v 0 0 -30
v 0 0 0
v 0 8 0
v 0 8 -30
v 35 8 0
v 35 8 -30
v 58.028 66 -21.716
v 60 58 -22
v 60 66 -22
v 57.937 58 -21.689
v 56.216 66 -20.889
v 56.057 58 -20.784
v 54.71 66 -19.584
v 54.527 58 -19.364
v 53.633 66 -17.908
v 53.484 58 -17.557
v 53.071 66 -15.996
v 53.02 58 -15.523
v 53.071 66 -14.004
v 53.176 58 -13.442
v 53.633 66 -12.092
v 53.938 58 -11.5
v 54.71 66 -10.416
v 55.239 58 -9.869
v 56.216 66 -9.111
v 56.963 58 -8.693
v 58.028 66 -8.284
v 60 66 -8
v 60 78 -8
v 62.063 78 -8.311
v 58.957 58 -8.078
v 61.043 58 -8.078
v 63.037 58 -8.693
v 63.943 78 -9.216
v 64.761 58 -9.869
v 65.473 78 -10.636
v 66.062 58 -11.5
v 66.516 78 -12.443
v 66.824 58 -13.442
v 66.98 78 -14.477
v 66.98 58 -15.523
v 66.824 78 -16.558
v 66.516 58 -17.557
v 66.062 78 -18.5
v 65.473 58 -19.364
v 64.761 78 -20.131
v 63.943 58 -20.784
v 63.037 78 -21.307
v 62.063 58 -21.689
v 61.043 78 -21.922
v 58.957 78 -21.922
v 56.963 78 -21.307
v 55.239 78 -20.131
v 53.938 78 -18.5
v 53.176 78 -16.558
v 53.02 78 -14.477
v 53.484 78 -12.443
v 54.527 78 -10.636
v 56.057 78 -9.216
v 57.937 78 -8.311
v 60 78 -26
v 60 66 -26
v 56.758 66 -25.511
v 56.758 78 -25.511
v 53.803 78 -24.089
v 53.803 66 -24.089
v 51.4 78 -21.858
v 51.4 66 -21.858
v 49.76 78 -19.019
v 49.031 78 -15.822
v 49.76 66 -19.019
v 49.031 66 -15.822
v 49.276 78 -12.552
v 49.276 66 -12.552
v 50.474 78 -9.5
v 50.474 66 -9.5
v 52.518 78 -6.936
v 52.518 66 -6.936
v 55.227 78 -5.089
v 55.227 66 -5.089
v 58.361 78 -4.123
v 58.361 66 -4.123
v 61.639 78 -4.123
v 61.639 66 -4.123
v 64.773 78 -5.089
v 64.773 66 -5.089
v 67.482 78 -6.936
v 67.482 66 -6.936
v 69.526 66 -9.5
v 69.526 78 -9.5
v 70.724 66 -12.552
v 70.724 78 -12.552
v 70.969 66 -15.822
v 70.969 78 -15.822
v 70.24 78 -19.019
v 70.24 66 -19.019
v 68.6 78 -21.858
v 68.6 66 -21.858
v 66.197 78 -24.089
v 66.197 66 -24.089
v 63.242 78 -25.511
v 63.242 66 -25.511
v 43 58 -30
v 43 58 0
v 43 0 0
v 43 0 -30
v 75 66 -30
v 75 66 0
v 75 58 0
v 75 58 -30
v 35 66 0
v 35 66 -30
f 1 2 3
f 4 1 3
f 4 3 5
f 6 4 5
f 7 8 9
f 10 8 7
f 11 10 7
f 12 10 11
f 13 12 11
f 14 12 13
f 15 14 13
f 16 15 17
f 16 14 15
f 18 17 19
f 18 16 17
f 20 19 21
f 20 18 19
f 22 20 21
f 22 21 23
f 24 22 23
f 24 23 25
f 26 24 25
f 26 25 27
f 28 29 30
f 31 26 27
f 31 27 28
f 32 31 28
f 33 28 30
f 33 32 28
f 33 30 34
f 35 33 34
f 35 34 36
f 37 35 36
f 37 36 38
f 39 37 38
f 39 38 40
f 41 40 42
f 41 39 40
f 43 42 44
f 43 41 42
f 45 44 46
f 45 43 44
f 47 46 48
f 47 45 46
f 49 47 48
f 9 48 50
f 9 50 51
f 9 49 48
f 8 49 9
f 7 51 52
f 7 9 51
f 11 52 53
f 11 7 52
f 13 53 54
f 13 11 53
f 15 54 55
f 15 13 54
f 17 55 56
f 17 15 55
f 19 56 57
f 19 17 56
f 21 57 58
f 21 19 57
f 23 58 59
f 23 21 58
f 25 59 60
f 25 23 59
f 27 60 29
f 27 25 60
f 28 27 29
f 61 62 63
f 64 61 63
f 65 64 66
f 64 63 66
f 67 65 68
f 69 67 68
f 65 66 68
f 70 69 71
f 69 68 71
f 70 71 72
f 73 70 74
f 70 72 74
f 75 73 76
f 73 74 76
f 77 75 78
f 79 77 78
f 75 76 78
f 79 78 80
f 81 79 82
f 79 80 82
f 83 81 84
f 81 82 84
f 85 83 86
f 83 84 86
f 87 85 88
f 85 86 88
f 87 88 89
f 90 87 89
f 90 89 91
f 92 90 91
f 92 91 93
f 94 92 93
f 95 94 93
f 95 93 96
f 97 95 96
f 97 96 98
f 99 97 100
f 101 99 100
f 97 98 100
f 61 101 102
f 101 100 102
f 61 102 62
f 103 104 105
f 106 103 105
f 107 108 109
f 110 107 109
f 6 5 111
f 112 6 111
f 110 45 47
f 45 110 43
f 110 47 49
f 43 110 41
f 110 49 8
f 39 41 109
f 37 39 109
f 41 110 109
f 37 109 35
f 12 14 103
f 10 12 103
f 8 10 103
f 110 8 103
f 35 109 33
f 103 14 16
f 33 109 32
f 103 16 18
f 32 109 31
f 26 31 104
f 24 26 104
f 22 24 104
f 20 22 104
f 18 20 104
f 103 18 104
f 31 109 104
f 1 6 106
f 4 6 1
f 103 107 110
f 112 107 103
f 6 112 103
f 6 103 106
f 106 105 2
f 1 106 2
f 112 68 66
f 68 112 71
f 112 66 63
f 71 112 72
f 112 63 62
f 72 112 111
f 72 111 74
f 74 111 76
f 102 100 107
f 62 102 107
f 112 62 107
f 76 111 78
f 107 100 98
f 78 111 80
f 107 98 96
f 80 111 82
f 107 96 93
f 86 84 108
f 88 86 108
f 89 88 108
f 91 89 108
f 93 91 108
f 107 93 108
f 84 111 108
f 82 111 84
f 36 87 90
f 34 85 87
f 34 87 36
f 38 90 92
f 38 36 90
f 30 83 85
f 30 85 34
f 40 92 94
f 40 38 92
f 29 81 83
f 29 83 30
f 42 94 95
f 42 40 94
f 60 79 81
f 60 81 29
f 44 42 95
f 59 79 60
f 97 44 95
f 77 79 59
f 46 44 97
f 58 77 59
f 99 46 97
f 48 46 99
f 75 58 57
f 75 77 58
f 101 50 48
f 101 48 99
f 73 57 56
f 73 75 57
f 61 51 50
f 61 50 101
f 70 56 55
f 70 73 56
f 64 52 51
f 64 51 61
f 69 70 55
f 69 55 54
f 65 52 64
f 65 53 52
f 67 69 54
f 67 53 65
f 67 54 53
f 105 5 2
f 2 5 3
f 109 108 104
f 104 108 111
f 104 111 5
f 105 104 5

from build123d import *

# Parameters (mm, degrees)
BOSS_EXTRUDE3_DEPTH = 30
SKETCH6_R           = 11
SKETCH6_R_2         = 7
BOSS_EXTRUDE4_DEPTH = 12
CUT_EXTRUDE1_START  = -20
SKETCH7_R           = 7
CUT_EXTRUDE1_DEPTH  = 20


with BuildPart() as part:
    # Sketch3 → Boss-Extrude3 (new body)
    with BuildSketch(Plane.XY):
        Polygon((0, 8), (35, 8), (35, 66), (75, 66), (75, 58), (43, 58), (43, 0), (0, 0), align=None)
    extrude(amount=-BOSS_EXTRUDE3_DEPTH)

    # Sketch6 → Boss-Extrude4 (add)
    with BuildSketch(Plane(origin=(0, 66, 0), x_dir=(1, 0, 0), z_dir=(0, 1, 0))):
        with Locations(Location((60, 15, 0), (0, 0, 90))):
            Circle(SKETCH6_R)
        with Locations(Location((60, 15, 0), (0, 0, 270))):
            Circle(SKETCH6_R_2, mode=Mode.SUBTRACT)
    extrude(amount=BOSS_EXTRUDE4_DEPTH)

    # Sketch7 → Cut-Extrude1 (cut)
    with BuildSketch(Plane(origin=(0, 66, 0), x_dir=(1, 0, 0), z_dir=(0, 1, 0)).offset(CUT_EXTRUDE1_START)):
        with Locations(Location((60, 15, 0), (0, 0, 90))):
            Circle(SKETCH7_R)
    extrude(amount=CUT_EXTRUDE1_DEPTH, mode=Mode.SUBTRACT)


solid = part.part
